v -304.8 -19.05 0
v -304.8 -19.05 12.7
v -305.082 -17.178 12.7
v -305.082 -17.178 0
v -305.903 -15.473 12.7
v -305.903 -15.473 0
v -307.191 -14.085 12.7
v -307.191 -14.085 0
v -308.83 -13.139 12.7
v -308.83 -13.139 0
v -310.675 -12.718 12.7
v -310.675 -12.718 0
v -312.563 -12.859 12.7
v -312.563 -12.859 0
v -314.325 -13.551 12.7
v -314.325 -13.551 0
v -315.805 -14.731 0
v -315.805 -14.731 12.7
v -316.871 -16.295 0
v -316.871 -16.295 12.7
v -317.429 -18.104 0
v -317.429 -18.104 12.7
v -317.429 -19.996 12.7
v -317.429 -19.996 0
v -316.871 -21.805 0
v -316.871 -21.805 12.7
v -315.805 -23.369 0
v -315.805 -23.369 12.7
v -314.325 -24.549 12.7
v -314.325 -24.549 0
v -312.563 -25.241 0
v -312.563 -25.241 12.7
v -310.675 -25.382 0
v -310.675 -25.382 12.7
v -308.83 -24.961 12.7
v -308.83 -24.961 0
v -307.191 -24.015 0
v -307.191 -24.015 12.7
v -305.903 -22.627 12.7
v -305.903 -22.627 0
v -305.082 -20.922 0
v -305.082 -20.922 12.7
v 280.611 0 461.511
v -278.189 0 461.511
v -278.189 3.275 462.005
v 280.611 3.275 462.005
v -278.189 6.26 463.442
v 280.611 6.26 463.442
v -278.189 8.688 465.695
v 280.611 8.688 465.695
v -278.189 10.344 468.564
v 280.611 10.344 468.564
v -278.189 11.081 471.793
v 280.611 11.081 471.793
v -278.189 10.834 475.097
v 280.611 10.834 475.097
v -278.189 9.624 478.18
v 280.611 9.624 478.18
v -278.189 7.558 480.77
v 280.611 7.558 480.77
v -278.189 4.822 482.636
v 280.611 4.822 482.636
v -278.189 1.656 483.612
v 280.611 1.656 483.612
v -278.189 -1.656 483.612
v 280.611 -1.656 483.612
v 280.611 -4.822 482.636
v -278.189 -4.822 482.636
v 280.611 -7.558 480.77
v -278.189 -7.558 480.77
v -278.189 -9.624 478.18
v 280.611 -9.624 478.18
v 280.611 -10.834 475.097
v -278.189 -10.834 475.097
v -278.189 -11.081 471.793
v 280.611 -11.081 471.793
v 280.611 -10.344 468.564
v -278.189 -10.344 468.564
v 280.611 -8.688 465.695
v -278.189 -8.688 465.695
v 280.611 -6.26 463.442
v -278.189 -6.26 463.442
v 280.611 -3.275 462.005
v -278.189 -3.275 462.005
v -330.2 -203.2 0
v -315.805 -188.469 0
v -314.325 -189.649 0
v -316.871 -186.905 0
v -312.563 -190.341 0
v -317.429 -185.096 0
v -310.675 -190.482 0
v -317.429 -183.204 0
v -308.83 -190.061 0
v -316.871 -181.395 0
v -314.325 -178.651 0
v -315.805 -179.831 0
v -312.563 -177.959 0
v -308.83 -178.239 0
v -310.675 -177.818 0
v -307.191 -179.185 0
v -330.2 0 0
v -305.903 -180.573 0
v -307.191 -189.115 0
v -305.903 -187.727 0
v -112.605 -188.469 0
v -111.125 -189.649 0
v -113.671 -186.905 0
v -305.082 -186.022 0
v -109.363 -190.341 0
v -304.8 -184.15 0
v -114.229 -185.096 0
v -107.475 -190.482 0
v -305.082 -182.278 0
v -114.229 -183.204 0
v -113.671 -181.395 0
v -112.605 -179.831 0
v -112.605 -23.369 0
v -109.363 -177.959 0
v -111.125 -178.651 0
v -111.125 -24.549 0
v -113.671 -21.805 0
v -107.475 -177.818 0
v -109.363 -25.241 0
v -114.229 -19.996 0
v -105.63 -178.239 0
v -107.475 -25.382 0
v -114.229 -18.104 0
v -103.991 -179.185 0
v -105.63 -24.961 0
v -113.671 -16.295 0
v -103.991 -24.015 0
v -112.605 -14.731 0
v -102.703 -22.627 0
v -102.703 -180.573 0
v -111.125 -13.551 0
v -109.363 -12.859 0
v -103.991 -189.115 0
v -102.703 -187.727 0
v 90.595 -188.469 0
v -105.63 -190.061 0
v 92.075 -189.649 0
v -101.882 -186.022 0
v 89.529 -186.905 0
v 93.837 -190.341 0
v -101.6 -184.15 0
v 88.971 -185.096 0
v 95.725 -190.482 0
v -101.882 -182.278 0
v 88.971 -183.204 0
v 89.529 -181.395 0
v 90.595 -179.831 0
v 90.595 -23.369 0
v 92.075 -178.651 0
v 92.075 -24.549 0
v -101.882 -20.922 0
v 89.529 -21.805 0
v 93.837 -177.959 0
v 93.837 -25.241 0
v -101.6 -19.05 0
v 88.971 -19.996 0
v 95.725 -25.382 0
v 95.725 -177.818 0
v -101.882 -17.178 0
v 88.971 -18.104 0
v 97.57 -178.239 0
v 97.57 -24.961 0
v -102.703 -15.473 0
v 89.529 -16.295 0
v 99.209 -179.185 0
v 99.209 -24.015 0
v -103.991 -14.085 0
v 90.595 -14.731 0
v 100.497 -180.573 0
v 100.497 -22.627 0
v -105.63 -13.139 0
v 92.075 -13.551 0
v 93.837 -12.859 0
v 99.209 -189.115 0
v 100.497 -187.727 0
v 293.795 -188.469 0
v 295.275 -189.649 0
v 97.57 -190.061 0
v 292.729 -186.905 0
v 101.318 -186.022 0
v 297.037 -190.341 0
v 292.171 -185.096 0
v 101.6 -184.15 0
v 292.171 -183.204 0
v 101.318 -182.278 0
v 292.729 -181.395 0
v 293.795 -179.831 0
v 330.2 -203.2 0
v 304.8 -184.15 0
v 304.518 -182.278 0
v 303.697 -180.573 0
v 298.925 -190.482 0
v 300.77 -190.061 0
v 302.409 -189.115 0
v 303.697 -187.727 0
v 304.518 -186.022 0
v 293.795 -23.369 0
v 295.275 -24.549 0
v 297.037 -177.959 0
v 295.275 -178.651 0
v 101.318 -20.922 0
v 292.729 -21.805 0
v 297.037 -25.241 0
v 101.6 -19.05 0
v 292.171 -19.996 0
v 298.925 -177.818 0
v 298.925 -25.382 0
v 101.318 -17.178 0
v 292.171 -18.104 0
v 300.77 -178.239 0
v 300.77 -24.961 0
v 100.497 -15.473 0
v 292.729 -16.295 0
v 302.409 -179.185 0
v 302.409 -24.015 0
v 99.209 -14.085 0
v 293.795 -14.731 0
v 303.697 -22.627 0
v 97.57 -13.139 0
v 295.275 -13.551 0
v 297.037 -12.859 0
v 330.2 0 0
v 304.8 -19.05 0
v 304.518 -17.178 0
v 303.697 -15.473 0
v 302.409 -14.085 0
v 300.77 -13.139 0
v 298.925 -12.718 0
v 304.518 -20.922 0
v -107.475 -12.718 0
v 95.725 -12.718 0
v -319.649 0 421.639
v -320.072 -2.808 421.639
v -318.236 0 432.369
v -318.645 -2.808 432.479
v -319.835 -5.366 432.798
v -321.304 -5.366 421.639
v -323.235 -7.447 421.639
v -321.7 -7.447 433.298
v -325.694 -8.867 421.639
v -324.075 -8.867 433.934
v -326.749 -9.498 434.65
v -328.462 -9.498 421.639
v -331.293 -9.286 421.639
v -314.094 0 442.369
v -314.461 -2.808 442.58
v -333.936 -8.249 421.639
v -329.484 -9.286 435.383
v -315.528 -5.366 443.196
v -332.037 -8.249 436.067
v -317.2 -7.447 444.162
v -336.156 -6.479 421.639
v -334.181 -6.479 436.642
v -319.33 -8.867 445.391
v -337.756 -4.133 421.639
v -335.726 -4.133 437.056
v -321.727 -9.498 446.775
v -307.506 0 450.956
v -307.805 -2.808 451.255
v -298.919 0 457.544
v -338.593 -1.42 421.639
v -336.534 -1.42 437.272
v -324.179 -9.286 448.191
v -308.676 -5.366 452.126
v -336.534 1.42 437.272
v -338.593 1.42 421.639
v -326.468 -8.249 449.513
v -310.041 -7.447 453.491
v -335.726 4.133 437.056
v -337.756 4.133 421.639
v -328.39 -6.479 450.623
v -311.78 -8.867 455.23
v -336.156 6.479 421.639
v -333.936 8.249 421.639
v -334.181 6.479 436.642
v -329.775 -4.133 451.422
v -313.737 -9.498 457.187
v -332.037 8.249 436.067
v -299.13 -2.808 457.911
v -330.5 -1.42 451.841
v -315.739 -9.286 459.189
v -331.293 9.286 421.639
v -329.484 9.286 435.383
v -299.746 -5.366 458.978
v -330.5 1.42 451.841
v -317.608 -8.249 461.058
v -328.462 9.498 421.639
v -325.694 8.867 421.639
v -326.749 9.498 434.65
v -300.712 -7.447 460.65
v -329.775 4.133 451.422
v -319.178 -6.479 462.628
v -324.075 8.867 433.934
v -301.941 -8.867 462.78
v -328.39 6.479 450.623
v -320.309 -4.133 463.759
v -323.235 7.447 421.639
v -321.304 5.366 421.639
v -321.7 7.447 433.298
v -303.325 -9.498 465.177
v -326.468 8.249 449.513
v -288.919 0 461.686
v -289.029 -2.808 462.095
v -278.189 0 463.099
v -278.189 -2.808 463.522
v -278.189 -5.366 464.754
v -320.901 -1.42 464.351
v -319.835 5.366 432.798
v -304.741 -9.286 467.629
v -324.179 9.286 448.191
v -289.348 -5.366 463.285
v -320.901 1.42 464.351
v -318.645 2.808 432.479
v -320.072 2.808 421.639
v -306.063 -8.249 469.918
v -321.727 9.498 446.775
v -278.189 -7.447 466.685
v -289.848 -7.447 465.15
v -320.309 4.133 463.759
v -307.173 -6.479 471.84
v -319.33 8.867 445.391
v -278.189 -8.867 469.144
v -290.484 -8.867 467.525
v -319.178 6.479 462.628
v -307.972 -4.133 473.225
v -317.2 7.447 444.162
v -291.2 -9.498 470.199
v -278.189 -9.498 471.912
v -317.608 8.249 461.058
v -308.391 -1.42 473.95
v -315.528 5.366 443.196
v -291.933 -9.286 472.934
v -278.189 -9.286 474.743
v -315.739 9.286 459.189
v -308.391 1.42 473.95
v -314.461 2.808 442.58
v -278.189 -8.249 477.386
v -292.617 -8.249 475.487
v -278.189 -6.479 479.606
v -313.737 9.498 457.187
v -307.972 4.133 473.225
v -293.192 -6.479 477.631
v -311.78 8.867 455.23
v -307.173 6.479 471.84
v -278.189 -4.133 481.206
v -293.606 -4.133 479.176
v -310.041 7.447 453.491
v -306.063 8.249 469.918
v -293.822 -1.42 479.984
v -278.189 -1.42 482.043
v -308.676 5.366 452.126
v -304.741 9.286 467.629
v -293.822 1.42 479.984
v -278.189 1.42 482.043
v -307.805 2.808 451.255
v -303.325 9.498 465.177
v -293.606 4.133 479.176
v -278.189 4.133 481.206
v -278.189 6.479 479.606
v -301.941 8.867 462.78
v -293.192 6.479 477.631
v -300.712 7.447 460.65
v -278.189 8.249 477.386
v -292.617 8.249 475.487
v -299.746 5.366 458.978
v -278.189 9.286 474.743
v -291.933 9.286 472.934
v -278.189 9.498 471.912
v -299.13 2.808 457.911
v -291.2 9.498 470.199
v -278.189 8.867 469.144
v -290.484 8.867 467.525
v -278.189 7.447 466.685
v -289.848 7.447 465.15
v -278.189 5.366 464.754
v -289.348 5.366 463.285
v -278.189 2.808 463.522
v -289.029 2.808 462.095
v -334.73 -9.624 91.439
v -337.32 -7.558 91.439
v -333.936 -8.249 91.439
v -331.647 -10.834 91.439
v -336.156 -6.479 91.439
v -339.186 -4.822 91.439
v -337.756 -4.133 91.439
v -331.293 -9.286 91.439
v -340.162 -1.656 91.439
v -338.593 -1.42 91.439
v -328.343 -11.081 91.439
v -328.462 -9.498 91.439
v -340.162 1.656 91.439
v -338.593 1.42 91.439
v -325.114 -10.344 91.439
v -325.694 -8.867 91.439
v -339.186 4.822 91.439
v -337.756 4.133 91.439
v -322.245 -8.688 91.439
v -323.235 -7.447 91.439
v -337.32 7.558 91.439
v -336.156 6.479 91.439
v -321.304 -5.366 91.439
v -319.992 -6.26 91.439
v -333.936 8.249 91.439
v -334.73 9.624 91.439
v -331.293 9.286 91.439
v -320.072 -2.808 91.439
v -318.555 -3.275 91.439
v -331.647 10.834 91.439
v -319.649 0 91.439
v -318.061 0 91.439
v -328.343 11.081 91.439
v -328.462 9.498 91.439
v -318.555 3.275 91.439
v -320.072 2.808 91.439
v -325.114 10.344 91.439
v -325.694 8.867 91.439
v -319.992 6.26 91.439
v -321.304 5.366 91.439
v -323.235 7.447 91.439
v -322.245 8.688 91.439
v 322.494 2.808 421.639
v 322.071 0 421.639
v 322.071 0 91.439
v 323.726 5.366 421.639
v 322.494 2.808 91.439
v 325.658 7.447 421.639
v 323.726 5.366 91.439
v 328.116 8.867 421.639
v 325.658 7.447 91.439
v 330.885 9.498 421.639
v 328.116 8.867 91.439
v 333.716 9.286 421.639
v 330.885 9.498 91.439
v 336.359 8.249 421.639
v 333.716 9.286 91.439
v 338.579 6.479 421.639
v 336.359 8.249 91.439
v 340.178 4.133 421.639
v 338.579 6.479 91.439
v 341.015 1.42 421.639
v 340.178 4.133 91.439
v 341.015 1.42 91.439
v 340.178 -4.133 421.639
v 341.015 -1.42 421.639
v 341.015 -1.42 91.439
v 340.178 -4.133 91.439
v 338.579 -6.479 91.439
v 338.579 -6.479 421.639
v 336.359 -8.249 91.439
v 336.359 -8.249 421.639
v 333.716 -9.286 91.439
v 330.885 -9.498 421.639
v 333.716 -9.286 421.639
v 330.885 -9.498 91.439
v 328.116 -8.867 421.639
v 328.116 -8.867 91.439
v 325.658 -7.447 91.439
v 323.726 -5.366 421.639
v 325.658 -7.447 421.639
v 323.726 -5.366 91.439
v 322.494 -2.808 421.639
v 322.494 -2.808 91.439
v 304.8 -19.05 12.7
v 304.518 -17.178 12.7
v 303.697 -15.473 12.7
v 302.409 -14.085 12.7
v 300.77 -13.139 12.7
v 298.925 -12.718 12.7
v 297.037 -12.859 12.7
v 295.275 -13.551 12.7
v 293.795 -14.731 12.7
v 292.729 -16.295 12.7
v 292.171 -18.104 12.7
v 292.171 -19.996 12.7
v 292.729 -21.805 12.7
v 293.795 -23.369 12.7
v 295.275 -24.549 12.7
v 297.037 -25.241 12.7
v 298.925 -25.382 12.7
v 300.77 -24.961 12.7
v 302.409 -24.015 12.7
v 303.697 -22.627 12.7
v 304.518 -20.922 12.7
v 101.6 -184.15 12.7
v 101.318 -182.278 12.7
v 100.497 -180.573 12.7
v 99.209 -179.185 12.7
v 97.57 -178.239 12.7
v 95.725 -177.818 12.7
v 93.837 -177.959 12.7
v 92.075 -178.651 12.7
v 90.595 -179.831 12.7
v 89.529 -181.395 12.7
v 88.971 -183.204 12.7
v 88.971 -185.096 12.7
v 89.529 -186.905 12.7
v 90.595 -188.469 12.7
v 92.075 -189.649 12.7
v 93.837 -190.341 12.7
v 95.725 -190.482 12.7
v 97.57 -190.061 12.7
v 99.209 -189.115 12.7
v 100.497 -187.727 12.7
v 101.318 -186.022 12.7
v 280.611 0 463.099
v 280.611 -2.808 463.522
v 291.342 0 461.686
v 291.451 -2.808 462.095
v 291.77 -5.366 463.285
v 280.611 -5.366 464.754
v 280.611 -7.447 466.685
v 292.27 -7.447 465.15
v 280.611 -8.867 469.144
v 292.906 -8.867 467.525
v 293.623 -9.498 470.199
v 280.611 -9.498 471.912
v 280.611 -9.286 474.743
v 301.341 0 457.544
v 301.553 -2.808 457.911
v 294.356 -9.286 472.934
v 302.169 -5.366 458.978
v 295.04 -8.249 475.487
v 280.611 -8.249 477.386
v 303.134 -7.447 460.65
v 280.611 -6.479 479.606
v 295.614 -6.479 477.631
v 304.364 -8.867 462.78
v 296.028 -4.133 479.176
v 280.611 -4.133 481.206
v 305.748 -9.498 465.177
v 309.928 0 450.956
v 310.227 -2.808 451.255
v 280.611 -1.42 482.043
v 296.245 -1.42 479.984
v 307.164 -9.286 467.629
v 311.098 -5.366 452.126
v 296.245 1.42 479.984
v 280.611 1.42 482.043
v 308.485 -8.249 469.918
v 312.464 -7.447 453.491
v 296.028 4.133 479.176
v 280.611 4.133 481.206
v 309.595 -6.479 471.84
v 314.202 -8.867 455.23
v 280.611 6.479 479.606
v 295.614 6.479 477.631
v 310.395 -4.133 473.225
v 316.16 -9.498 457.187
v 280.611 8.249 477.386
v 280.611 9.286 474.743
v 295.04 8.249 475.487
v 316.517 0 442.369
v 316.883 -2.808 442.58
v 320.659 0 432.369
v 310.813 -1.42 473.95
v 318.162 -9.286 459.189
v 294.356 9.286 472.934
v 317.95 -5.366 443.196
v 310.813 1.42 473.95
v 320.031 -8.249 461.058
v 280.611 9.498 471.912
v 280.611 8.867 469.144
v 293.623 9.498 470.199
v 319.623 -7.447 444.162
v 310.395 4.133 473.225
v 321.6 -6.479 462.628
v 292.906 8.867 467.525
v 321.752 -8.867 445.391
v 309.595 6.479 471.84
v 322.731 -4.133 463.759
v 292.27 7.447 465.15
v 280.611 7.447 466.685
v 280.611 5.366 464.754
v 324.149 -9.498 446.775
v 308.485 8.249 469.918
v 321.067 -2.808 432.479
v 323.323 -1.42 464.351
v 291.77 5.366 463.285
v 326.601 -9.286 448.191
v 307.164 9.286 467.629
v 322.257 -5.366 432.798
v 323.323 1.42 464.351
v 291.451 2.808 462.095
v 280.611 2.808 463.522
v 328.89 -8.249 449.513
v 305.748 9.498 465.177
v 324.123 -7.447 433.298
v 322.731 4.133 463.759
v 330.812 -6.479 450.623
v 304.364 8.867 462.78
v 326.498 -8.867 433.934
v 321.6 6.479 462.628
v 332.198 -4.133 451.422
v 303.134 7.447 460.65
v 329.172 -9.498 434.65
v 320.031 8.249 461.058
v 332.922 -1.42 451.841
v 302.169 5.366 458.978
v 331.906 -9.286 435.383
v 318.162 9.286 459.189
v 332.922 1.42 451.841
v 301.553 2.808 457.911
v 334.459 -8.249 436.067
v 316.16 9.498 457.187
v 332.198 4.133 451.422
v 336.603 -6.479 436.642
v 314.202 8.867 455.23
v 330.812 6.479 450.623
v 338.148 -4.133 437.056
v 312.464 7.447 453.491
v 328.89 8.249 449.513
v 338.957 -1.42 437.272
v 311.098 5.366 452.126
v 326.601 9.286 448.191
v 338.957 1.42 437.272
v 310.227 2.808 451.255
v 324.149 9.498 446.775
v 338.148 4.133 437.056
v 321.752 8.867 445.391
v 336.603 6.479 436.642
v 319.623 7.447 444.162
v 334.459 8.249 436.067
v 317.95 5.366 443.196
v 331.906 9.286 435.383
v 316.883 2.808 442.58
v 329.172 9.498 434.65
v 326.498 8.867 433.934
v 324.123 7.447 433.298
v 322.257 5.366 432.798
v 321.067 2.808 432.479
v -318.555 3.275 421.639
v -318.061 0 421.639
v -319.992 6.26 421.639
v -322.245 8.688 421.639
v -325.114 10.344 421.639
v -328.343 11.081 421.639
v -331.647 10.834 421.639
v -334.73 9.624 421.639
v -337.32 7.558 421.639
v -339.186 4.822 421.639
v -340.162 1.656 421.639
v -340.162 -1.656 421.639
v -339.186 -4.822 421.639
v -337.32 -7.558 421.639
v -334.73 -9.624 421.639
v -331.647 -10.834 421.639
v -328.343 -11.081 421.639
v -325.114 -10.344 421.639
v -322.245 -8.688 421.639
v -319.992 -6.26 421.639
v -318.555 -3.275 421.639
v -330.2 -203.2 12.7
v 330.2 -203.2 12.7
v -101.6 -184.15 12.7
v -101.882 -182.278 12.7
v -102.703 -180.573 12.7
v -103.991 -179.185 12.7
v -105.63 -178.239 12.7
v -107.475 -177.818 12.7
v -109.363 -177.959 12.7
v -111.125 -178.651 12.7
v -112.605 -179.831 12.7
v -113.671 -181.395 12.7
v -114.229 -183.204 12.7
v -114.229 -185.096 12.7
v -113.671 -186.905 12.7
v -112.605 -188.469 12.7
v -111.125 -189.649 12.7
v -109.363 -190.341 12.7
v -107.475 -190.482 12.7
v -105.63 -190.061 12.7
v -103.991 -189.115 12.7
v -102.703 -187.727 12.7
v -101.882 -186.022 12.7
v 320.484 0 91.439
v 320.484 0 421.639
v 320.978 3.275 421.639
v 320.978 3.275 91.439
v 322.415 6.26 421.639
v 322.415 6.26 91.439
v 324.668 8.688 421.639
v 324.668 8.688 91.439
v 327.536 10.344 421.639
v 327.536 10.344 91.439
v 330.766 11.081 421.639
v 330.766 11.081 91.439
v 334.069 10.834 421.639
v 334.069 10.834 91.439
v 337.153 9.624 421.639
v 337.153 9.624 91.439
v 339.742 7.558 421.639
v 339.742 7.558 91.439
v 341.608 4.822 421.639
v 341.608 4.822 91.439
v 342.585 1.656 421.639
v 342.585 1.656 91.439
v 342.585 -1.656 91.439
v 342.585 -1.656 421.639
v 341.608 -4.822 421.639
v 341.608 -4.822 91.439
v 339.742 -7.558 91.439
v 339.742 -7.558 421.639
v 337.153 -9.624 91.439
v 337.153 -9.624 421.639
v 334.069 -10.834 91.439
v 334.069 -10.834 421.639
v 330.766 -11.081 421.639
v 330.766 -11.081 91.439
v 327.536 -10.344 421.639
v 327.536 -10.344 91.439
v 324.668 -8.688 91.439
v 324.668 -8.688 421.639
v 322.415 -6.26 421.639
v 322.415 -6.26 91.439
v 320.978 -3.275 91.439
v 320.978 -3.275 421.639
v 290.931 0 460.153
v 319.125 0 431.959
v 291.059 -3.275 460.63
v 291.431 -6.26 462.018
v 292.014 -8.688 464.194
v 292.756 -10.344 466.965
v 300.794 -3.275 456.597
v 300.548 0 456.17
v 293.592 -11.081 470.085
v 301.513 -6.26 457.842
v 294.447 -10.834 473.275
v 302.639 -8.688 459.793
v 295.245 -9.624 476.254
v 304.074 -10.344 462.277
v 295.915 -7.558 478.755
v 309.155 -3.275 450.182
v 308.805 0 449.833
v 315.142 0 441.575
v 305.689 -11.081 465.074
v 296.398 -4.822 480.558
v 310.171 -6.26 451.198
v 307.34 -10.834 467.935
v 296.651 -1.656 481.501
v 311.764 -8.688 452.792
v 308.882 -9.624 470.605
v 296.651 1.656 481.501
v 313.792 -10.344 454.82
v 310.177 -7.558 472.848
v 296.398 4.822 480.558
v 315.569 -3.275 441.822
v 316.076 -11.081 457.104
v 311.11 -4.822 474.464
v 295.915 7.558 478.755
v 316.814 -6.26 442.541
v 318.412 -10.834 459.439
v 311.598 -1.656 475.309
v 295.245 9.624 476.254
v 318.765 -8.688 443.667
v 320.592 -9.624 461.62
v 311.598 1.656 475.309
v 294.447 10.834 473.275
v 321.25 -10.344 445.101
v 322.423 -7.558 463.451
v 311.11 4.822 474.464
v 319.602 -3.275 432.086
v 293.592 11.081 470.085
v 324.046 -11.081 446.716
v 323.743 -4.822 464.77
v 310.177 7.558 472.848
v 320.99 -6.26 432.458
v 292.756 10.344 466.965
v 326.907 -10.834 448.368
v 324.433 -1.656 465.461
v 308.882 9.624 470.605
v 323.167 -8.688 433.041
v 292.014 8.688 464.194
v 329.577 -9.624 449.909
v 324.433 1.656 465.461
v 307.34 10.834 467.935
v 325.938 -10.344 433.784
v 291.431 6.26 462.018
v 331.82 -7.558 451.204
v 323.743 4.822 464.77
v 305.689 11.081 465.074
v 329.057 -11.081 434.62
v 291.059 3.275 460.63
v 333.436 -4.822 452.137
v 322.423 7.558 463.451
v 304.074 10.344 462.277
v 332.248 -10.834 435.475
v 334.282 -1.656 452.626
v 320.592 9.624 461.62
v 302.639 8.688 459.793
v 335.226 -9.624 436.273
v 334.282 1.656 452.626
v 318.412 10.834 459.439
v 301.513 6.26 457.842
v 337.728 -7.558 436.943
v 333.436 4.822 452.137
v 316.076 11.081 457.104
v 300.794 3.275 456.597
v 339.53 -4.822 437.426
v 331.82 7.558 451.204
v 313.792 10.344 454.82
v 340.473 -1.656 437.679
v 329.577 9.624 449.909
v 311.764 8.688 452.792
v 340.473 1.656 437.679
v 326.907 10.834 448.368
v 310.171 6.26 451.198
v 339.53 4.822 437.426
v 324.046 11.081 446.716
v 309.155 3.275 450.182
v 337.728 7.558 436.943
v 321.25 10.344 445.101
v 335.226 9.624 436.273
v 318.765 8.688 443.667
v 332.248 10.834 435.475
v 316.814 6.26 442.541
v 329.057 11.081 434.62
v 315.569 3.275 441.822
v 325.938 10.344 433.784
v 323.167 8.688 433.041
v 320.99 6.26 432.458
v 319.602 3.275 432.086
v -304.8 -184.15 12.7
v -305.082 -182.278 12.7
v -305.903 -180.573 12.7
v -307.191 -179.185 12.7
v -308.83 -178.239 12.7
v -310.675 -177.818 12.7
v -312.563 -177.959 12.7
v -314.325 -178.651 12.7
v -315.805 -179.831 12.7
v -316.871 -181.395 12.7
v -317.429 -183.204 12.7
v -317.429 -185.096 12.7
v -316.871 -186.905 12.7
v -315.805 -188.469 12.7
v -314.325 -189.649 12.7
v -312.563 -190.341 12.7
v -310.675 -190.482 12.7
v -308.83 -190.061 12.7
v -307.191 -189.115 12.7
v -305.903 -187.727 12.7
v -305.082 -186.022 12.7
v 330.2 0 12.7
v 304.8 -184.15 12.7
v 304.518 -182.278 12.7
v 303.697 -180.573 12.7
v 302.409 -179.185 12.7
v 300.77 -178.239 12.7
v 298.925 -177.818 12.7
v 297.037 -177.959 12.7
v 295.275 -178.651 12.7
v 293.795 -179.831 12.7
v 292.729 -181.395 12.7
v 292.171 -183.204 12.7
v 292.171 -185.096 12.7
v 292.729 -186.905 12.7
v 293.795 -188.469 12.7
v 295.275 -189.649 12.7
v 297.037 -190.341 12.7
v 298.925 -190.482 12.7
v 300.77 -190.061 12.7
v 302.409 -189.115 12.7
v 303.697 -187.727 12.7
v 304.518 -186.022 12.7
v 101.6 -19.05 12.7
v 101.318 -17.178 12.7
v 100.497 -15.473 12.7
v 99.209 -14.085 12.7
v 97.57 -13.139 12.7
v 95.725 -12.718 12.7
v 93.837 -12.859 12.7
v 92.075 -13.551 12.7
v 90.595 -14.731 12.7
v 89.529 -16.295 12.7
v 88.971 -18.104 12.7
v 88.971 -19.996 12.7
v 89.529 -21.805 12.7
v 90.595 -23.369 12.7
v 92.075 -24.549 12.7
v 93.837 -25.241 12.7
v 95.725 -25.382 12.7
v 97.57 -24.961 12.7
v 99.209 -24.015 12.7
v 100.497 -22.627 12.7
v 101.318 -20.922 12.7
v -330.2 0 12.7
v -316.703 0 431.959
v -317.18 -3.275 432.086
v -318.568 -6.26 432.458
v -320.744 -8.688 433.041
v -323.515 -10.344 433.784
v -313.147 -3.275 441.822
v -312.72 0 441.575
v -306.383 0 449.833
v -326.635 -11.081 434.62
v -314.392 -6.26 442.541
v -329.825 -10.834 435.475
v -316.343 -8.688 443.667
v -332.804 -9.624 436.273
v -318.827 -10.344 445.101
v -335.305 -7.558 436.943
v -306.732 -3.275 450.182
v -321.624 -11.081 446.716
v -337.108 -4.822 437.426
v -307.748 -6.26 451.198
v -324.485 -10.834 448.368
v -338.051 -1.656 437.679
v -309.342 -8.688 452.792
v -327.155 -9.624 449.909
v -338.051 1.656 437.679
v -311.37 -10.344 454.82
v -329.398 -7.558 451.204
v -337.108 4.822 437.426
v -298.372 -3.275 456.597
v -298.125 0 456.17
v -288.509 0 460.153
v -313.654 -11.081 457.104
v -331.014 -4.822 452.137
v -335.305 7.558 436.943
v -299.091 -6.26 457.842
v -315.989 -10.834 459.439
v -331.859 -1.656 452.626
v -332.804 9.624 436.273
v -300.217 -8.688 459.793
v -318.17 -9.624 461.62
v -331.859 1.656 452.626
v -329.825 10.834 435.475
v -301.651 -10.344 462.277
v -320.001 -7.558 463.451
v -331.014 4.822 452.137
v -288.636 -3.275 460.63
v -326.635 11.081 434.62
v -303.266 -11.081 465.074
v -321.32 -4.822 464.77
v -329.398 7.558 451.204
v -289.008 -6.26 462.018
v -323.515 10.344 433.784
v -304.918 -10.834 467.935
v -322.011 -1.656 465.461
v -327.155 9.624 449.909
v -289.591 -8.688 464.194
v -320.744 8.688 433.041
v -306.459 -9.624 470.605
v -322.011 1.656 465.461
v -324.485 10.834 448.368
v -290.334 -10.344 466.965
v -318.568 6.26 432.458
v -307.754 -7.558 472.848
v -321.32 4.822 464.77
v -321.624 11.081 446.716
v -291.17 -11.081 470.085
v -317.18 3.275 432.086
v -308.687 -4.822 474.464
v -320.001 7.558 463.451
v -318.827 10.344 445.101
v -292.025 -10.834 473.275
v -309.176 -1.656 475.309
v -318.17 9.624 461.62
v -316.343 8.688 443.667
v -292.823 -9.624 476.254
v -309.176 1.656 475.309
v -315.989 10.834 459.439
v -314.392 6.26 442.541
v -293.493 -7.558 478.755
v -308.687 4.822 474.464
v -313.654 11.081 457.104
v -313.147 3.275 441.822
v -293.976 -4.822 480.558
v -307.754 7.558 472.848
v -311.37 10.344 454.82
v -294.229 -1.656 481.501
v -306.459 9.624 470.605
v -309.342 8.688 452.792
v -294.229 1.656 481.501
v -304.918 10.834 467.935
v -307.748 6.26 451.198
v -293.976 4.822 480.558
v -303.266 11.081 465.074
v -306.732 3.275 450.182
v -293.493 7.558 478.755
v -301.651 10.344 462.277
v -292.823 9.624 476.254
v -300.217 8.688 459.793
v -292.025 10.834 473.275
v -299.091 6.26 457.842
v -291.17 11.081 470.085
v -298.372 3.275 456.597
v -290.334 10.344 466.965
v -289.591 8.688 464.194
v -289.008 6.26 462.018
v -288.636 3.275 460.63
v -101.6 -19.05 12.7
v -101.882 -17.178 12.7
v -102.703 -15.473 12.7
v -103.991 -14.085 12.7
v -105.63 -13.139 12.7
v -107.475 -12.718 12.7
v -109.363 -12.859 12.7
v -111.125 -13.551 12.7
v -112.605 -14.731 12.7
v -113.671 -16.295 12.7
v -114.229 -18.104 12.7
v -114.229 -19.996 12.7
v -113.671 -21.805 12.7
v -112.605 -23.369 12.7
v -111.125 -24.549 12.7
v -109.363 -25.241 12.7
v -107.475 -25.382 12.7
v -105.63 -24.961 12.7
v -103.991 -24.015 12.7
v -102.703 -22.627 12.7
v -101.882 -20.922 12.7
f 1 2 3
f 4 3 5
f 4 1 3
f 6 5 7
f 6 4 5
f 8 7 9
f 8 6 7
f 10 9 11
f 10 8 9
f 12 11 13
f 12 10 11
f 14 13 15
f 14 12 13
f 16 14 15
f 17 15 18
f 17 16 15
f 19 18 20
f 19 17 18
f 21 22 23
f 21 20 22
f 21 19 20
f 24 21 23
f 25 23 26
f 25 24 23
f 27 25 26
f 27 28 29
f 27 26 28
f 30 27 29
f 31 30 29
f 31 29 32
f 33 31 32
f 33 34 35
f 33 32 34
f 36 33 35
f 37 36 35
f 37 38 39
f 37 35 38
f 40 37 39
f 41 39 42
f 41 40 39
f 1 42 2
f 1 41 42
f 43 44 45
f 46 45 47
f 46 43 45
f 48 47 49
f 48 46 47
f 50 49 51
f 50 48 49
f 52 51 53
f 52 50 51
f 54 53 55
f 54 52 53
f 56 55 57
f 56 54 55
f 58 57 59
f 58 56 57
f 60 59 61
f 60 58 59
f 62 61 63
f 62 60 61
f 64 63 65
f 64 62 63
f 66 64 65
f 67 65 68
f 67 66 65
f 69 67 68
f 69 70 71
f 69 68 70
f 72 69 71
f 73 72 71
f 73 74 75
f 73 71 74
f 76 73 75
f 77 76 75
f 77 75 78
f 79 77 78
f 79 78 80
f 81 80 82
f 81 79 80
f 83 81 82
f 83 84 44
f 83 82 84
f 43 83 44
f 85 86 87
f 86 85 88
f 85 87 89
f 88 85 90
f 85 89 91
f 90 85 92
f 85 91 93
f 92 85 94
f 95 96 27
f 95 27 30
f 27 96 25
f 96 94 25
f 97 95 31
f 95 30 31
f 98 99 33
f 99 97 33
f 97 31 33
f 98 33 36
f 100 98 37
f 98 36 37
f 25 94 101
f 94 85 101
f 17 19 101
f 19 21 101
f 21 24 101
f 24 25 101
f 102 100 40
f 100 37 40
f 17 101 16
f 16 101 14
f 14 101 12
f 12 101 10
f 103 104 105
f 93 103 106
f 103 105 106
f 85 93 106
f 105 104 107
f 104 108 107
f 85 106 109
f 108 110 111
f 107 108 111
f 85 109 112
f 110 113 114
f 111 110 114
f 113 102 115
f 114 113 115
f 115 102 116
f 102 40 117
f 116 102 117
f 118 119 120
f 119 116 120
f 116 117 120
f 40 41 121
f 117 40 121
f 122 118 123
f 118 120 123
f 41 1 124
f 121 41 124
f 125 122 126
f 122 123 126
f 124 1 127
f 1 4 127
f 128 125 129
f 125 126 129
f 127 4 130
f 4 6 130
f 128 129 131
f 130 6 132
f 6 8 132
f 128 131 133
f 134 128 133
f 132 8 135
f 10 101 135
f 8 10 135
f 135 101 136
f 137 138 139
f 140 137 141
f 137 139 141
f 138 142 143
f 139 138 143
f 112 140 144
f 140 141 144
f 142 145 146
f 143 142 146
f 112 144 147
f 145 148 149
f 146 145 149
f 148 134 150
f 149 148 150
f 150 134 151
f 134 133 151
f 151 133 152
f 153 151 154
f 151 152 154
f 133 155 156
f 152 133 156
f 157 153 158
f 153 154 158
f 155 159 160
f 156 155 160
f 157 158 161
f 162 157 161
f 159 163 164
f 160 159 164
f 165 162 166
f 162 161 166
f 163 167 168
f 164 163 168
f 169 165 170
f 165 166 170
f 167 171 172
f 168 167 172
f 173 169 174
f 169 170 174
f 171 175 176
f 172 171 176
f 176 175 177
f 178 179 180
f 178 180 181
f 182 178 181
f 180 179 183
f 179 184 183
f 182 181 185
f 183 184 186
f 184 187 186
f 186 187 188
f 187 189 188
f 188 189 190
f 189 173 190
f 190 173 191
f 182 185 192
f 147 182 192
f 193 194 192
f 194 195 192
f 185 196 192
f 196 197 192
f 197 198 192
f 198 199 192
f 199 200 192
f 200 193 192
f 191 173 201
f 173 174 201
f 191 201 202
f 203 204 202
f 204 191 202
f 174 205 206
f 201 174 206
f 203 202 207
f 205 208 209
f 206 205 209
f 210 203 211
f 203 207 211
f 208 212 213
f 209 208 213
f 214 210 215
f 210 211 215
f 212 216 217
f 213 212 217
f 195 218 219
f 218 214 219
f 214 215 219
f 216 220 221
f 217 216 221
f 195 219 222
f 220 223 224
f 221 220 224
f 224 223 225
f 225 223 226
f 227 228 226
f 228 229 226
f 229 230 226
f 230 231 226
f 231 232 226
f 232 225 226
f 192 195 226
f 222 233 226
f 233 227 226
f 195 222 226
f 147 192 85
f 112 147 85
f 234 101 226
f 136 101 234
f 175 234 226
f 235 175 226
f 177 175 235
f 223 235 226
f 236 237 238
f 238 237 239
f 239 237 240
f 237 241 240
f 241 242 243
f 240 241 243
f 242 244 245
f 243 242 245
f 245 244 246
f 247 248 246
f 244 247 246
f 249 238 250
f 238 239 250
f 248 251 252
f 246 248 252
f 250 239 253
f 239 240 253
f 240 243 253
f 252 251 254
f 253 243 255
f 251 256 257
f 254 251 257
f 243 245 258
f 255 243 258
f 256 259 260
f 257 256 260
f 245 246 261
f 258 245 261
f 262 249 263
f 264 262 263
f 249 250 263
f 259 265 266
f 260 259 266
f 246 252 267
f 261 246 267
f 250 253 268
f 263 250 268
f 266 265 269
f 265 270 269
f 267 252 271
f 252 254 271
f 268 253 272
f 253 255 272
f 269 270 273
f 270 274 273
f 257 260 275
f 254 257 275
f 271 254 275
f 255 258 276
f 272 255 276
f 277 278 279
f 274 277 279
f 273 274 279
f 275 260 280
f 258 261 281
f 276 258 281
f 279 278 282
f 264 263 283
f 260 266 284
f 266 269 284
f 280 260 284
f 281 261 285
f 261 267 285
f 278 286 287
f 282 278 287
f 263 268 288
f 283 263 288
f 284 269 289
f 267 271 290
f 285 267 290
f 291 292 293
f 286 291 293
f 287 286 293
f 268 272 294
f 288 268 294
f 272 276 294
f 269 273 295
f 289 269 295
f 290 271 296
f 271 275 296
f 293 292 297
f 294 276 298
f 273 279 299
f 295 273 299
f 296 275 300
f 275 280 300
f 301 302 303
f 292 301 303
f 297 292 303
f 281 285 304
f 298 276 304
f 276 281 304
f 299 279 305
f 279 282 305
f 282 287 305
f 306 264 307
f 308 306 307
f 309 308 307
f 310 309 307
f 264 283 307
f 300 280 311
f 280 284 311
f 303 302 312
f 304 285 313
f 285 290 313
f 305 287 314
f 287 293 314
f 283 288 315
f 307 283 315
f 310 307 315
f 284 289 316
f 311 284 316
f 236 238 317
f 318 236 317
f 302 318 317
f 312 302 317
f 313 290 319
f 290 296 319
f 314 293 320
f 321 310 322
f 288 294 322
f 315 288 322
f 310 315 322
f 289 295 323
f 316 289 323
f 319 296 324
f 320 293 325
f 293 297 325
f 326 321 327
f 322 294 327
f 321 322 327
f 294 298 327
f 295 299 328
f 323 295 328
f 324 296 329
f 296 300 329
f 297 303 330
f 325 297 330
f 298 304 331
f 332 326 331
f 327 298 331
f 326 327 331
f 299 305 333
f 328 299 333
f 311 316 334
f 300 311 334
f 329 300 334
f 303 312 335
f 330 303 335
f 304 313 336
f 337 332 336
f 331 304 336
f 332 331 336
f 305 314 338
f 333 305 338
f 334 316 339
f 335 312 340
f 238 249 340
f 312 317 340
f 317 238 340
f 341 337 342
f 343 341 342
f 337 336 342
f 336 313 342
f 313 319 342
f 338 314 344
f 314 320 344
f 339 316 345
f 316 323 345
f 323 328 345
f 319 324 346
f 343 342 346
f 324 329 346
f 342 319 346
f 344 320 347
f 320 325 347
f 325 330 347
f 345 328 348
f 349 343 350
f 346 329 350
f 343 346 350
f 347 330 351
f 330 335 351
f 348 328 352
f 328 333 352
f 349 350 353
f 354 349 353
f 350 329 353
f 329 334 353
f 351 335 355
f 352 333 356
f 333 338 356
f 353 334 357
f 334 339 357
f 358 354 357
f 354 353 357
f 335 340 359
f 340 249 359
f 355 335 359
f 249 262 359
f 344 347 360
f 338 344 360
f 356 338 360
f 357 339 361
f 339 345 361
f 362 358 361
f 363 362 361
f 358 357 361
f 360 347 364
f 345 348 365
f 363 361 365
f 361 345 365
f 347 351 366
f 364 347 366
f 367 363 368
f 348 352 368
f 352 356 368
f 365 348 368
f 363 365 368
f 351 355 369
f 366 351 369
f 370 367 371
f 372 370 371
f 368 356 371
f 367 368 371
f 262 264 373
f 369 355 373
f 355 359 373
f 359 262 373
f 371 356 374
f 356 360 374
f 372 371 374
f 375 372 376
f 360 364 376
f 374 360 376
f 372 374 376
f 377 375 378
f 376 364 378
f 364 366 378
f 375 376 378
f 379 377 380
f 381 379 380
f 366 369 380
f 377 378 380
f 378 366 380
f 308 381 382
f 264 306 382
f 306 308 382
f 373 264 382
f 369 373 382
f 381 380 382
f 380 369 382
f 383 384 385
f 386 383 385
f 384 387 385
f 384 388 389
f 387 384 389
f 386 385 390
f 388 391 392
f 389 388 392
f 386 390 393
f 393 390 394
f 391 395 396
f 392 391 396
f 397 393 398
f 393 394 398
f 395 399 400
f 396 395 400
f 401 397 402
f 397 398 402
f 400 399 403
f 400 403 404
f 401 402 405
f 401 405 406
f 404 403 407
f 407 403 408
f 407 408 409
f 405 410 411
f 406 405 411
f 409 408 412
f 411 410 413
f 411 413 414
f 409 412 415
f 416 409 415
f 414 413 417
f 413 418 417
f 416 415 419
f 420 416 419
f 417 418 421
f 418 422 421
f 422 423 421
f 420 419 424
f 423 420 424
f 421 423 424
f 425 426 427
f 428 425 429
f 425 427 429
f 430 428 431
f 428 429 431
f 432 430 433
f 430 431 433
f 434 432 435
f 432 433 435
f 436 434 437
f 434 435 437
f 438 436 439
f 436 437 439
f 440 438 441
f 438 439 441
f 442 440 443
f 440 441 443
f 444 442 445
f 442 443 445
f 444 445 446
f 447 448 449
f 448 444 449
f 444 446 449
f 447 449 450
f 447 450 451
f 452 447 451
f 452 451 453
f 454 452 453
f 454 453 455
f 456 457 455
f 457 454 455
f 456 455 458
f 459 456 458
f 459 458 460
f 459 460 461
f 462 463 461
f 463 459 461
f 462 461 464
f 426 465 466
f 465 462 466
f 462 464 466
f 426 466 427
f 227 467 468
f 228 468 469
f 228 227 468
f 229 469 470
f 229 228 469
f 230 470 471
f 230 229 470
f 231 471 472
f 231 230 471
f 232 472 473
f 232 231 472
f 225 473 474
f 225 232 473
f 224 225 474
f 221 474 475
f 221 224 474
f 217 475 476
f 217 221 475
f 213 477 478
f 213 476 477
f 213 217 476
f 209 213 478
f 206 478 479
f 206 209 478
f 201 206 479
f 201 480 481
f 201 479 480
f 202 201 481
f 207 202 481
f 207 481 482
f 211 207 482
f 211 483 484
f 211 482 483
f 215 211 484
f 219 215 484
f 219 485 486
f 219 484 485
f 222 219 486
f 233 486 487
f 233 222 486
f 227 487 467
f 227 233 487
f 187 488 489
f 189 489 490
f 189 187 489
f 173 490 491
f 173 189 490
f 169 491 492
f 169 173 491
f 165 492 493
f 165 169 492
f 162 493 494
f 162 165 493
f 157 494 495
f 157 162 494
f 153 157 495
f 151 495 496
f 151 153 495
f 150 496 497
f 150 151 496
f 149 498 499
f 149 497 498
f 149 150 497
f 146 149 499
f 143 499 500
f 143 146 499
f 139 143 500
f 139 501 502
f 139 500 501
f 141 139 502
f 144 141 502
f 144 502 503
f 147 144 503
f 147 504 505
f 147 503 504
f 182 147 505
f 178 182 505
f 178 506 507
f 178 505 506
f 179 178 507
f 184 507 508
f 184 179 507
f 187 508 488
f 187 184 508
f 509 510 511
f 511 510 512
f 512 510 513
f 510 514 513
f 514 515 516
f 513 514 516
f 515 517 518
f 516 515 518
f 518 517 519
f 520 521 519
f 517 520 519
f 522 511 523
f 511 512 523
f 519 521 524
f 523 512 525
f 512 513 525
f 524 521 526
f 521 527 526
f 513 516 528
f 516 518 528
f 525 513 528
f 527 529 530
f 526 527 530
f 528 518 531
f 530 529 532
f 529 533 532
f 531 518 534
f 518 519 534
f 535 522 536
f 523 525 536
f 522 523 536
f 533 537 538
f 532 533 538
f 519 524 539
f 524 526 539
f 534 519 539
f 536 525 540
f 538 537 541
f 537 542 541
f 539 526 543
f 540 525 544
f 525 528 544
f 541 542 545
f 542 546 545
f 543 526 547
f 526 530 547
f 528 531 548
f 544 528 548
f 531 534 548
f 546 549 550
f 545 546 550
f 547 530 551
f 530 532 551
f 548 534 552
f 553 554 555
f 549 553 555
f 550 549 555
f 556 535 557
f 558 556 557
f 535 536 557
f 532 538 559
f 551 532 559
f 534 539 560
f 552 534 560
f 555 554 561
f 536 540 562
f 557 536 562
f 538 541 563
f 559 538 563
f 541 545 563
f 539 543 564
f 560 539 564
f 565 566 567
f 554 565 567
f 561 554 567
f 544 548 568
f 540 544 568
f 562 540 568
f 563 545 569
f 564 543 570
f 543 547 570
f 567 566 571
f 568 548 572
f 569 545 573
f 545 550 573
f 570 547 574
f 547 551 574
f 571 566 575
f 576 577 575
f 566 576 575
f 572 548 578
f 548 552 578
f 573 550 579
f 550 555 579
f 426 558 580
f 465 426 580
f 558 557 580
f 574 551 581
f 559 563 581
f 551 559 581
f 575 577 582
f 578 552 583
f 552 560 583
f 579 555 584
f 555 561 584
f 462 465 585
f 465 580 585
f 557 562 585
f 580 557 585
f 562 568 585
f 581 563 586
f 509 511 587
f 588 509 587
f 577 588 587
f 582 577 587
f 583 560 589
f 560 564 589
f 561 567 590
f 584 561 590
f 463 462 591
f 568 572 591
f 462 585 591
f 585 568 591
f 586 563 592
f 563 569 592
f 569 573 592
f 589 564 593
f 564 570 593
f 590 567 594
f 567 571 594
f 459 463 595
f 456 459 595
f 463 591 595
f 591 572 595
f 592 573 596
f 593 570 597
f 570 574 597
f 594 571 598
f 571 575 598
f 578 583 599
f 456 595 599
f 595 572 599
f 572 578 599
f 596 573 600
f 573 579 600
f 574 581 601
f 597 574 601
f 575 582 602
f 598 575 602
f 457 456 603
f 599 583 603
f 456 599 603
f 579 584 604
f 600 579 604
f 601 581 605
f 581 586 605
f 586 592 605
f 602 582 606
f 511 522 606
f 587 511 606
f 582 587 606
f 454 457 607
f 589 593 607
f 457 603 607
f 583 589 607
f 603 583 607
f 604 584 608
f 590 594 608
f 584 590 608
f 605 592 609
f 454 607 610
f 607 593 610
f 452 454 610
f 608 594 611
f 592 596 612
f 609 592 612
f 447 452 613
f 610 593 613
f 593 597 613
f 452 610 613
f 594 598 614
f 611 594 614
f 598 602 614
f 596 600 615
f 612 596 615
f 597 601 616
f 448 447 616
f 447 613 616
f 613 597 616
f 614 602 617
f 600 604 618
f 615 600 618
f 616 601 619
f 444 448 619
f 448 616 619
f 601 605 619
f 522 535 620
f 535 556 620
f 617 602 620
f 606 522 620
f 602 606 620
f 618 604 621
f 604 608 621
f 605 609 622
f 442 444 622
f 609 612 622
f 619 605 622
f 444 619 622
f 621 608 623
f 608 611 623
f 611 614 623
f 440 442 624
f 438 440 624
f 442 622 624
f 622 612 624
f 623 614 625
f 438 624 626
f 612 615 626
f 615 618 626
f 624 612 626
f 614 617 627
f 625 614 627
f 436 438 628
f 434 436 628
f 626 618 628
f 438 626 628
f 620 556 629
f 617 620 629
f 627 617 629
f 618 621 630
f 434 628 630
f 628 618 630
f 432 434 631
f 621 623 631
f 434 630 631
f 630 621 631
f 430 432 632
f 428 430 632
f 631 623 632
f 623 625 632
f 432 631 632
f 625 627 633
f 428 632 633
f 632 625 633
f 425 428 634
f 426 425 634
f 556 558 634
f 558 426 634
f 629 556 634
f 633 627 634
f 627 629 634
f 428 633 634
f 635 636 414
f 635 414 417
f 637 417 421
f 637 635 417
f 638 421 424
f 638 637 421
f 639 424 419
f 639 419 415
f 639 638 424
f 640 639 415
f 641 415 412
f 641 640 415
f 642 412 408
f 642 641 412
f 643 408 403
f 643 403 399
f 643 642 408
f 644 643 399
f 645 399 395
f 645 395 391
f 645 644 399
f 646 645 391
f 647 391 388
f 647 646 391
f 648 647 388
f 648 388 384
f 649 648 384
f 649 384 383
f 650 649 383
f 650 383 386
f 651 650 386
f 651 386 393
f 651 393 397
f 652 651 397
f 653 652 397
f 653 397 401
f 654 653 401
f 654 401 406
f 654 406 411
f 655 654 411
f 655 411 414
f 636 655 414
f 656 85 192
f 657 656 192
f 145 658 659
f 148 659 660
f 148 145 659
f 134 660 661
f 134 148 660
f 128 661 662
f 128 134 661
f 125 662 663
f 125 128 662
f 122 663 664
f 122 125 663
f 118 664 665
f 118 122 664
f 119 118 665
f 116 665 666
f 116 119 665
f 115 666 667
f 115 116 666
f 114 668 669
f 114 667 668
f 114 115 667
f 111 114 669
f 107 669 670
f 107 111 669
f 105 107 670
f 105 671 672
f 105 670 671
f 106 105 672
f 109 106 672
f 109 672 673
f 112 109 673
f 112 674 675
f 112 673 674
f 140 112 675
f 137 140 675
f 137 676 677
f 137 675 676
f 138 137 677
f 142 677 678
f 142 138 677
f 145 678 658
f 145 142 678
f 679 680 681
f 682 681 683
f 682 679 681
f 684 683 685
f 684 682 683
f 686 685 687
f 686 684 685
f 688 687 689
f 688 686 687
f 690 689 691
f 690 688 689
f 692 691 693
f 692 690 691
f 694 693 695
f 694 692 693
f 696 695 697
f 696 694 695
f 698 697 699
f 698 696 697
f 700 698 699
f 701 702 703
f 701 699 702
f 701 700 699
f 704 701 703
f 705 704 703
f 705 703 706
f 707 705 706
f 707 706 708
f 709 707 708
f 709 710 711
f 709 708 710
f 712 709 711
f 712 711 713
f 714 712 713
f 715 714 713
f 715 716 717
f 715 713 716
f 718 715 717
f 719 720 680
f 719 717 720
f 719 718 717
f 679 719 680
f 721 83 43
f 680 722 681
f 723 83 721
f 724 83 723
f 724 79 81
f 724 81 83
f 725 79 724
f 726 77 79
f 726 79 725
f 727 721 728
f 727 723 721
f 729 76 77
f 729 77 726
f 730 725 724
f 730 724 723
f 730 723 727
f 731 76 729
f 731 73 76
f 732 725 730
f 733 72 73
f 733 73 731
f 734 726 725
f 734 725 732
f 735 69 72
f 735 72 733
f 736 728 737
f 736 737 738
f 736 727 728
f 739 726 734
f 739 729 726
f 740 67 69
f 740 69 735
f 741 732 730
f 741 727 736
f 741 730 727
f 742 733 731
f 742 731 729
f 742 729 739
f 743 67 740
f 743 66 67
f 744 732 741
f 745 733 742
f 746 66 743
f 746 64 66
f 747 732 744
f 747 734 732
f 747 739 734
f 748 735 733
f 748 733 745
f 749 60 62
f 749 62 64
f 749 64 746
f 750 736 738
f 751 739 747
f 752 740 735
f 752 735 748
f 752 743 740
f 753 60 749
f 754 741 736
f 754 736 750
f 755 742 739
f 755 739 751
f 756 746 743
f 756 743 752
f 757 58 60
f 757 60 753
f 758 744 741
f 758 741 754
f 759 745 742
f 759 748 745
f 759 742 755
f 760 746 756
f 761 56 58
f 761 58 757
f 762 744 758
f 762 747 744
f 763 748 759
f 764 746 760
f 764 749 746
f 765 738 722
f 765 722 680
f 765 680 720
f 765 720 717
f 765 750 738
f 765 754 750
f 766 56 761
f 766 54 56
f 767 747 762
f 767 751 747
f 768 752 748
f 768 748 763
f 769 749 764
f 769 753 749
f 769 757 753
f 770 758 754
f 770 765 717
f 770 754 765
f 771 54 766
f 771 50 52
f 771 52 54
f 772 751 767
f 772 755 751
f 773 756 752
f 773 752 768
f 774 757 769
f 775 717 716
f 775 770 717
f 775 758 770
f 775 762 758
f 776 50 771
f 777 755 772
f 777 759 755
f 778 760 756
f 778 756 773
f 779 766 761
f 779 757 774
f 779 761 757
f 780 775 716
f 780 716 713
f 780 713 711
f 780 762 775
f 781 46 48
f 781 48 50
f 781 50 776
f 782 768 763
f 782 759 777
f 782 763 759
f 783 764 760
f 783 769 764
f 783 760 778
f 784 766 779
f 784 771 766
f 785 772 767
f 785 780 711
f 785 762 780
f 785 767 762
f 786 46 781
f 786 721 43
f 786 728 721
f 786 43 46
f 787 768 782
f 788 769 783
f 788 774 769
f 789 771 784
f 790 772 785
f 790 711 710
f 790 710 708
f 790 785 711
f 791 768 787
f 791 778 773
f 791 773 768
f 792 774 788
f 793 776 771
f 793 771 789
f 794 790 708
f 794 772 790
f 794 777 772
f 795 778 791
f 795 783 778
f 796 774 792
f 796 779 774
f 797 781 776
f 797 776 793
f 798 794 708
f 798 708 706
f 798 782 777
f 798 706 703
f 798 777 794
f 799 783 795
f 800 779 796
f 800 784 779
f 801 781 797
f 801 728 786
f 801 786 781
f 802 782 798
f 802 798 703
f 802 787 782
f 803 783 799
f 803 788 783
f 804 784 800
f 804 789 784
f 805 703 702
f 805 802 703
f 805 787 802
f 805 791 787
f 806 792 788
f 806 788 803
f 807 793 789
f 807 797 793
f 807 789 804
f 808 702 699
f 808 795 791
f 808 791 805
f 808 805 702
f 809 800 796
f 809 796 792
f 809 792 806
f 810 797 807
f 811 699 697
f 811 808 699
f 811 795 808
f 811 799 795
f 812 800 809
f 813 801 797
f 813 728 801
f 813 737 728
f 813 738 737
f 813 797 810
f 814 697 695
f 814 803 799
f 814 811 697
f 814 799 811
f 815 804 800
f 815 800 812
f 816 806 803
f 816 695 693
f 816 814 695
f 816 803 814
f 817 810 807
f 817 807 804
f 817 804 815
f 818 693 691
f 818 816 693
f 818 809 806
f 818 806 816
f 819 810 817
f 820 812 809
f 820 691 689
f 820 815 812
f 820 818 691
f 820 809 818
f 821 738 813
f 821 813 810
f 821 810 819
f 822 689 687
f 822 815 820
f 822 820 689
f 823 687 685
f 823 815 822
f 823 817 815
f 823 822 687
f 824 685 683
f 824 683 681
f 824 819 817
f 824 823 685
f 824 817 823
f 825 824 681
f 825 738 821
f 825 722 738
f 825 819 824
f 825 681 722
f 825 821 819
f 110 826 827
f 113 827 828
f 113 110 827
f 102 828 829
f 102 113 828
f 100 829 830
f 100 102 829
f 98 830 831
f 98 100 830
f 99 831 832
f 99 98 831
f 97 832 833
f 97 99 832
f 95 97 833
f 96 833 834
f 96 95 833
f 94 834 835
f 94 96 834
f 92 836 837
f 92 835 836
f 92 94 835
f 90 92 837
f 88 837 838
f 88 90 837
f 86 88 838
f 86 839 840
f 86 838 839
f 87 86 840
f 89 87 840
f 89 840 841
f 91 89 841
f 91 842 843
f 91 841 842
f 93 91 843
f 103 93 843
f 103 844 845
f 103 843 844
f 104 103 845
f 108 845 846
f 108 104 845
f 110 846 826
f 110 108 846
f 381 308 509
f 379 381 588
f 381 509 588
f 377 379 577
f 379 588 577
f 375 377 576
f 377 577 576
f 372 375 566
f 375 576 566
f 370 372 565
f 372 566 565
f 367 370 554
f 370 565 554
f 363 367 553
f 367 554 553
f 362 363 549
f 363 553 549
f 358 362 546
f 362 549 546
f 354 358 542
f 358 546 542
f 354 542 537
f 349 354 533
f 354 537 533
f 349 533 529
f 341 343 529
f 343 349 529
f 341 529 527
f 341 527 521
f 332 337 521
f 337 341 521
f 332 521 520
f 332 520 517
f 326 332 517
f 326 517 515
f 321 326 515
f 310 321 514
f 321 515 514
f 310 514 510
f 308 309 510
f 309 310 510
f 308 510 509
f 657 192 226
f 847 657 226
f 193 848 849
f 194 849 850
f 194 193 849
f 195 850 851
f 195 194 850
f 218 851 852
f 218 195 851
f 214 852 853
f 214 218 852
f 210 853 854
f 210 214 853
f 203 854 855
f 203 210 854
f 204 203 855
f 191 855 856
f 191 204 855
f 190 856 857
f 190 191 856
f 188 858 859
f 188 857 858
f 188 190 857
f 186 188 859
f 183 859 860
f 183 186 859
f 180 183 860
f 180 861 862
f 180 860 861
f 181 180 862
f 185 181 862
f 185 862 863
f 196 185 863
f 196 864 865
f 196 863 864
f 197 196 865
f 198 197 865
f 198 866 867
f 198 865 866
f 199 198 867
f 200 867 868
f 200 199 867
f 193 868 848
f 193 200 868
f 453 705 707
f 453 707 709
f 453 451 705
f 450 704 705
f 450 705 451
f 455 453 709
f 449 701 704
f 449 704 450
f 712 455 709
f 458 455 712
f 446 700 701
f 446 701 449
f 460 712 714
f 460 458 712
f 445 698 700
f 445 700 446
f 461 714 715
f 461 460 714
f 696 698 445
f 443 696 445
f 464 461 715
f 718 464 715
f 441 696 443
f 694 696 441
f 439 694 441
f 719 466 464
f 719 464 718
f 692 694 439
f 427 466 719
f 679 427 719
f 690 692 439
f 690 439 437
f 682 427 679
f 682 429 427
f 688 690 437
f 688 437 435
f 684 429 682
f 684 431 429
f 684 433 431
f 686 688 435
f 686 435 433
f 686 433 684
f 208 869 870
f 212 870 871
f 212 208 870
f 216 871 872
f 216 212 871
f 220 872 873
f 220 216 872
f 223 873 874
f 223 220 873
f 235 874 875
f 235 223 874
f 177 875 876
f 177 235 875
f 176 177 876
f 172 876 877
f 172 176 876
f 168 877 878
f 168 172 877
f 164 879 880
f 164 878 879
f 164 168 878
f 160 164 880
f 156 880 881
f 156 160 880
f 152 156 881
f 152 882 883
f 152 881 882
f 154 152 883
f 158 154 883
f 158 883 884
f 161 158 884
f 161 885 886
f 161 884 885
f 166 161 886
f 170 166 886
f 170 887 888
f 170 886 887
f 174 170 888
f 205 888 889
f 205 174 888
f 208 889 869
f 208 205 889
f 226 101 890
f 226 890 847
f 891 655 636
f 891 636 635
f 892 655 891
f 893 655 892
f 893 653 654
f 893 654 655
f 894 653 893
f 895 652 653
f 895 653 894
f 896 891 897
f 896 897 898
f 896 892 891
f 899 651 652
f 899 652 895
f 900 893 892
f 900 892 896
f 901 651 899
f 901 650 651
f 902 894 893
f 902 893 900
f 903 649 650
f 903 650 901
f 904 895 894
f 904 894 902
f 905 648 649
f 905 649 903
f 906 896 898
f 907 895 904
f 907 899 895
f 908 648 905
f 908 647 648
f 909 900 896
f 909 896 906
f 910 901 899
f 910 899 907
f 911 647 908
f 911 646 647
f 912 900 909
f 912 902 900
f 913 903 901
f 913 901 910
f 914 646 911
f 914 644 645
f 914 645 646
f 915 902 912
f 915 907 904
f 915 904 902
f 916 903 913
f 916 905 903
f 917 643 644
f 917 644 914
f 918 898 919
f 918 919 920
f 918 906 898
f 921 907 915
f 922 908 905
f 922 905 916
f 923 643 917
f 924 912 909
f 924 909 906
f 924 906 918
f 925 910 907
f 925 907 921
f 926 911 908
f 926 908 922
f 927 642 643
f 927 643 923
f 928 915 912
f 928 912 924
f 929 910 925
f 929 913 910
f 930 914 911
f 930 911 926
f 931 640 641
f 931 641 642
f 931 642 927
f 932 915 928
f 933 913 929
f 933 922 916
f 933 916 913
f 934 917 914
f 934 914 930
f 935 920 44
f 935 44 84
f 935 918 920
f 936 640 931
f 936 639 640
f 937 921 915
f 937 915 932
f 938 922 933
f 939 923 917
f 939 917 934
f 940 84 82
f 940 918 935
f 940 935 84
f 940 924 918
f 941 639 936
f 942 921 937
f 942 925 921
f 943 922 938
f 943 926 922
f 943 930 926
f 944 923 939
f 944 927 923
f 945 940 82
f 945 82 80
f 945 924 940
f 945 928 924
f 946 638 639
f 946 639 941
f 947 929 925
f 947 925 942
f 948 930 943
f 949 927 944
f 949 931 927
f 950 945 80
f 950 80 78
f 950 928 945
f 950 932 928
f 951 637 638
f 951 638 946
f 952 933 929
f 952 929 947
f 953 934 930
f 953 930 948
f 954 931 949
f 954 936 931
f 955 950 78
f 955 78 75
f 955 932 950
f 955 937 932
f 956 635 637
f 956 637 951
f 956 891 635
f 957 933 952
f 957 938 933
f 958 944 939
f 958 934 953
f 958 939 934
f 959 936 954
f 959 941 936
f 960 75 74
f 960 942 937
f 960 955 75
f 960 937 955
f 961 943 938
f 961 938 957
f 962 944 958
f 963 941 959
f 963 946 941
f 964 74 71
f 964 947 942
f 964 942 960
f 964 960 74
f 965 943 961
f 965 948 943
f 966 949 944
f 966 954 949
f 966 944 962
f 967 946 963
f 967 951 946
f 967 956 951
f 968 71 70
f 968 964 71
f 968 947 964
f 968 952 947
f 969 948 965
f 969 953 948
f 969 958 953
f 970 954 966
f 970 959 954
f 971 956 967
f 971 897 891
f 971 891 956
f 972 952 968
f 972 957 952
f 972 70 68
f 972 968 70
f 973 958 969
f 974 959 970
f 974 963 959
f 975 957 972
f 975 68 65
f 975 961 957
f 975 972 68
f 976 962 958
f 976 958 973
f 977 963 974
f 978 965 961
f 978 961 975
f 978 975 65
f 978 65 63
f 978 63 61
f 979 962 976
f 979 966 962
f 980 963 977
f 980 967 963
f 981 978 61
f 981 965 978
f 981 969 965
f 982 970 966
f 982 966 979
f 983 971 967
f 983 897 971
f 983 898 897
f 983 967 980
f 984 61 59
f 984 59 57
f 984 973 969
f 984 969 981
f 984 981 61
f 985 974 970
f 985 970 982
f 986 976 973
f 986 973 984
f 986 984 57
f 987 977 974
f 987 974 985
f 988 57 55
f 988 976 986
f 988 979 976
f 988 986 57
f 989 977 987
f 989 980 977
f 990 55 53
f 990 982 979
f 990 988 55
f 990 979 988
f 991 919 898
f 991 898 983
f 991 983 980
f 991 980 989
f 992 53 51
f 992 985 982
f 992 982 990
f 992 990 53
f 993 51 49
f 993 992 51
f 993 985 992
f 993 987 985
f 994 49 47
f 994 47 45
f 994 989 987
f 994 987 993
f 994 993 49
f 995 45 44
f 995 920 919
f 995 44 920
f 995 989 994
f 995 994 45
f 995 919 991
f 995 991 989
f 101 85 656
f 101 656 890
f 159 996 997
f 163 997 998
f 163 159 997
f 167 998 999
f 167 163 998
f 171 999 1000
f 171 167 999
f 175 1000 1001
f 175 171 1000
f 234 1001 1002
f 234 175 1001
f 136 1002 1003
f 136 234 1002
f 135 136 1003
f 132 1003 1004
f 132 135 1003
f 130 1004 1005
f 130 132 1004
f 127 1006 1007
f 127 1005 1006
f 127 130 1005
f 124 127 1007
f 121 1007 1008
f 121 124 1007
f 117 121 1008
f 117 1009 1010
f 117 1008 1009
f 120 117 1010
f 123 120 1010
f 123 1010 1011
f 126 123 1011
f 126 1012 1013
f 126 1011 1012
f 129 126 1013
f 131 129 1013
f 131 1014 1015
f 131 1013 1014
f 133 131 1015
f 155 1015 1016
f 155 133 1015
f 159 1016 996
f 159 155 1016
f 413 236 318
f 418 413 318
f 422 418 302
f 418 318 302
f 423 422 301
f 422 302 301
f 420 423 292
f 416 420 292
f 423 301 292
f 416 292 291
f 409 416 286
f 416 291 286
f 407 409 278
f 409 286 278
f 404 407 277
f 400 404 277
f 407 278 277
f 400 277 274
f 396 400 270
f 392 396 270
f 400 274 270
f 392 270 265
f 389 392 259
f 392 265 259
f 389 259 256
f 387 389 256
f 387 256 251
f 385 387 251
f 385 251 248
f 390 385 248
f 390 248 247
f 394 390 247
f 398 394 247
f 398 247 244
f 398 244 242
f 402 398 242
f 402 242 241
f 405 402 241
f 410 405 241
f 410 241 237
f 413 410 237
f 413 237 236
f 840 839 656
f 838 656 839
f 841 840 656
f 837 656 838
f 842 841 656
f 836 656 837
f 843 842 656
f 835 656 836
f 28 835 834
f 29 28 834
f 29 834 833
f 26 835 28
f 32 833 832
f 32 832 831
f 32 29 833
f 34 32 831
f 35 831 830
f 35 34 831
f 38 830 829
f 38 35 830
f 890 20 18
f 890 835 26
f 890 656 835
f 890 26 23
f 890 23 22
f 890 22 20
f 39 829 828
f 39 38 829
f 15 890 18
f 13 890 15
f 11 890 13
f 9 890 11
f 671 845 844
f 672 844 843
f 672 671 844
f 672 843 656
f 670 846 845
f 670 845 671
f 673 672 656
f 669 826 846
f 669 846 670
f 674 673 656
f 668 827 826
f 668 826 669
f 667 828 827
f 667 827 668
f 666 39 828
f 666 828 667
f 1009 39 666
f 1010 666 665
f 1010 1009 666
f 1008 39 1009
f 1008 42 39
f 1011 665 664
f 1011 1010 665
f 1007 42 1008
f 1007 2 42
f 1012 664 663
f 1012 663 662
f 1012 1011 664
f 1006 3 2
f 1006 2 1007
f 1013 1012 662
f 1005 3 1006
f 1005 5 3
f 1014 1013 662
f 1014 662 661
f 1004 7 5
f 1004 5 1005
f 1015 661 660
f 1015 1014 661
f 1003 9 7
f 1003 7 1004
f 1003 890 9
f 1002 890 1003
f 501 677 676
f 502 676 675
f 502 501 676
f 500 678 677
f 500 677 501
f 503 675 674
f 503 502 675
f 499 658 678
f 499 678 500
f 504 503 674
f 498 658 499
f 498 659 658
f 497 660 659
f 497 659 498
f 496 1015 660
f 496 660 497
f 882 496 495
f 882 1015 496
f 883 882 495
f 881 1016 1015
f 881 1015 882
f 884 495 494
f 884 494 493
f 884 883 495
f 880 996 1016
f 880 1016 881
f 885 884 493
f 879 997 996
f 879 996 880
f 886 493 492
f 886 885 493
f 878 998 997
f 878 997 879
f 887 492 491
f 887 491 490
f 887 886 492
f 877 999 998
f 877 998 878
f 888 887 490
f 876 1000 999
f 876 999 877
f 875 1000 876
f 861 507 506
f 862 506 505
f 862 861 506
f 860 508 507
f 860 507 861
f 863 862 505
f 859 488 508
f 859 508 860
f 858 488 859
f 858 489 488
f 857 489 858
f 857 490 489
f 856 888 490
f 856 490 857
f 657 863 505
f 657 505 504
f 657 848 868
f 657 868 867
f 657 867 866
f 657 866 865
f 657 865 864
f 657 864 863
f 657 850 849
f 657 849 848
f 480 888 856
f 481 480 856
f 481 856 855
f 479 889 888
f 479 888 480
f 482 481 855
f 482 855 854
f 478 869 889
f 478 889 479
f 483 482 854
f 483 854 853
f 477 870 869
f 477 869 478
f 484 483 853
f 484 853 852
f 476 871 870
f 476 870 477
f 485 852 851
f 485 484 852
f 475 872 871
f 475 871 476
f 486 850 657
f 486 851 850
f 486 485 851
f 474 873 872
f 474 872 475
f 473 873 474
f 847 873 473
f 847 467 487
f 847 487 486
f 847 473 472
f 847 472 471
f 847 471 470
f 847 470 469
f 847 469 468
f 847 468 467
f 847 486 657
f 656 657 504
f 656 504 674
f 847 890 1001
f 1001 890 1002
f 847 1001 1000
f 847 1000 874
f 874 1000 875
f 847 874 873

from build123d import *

# Parameters (mm, degrees)
F0_W     = 660.4
F0_H     = 203.2
F2_DEPTH = 12.7
F1_R     = 6.35
F3_DEPTH = 12.701
F6_R     = 11.1125
F6_R_2   = 9.525


with BuildPart() as f2:
    # F0 (on Top) → F2 (new body)
    with BuildSketch(Plane.XY):
        with Locations((0, -101.6)):
            Rectangle(F0_W, F0_H)
    extrude(amount=F2_DEPTH)

    # F1 (on face) → F3 (cut, through all)
    with BuildSketch(Plane.XY):
        with Locations((-311.15, -184.15)):
            Circle(F1_R)
        with Locations((-311.15, -19.05)):
            Circle(F1_R)
        with Locations((-107.95, -184.15)):
            Circle(F1_R)
        with Locations((-107.95, -19.05)):
            Circle(F1_R)
        with Locations((95.25, -184.15)):
            Circle(F1_R)
        with Locations((95.25, -19.05)):
            Circle(F1_R)
        with Locations((298.45, -184.15)):
            Circle(F1_R)
        with Locations((298.45, -19.05)):
            Circle(F1_R)
    extrude(amount=F3_DEPTH, mode=Mode.SUBTRACT)


with BuildPart() as f7:
    # F7: sweep along a path in F4
    with BuildLine(Plane.XZ) as f7_path:
        Line((-328.9887982047, 91.4388030012), (-328.9887982047, 421.6388030012))
        ThreePointArc((-328.9887982047, 421.6388030012), (-314.109822689, 457.5598274855), (-278.1887982047, 472.4388030012))
        Line((-278.1887982047, 472.4388030012), (280.6112017953, 472.4388030012))
        ThreePointArc((280.6112017953, 472.4388030012), (316.5322262796, 457.5598274855), (331.4112017953, 421.6388030012))
        Line((331.4112017953, 421.6388030012), (331.4112017953, 91.4388030012))
    # F6 (on plane+point) → F7 (sweep)
    with BuildSketch(Plane.XY.offset(91.4388030012)):
        with Locations((-329.1739225388, 0)):
            Circle(F6_R)
        with Locations((-329.1739225388, 0)):
            Circle(F6_R_2, mode=Mode.SUBTRACT)
    sweep(path=f7_path.line)


solid = Compound([f2.part, f7.part])
